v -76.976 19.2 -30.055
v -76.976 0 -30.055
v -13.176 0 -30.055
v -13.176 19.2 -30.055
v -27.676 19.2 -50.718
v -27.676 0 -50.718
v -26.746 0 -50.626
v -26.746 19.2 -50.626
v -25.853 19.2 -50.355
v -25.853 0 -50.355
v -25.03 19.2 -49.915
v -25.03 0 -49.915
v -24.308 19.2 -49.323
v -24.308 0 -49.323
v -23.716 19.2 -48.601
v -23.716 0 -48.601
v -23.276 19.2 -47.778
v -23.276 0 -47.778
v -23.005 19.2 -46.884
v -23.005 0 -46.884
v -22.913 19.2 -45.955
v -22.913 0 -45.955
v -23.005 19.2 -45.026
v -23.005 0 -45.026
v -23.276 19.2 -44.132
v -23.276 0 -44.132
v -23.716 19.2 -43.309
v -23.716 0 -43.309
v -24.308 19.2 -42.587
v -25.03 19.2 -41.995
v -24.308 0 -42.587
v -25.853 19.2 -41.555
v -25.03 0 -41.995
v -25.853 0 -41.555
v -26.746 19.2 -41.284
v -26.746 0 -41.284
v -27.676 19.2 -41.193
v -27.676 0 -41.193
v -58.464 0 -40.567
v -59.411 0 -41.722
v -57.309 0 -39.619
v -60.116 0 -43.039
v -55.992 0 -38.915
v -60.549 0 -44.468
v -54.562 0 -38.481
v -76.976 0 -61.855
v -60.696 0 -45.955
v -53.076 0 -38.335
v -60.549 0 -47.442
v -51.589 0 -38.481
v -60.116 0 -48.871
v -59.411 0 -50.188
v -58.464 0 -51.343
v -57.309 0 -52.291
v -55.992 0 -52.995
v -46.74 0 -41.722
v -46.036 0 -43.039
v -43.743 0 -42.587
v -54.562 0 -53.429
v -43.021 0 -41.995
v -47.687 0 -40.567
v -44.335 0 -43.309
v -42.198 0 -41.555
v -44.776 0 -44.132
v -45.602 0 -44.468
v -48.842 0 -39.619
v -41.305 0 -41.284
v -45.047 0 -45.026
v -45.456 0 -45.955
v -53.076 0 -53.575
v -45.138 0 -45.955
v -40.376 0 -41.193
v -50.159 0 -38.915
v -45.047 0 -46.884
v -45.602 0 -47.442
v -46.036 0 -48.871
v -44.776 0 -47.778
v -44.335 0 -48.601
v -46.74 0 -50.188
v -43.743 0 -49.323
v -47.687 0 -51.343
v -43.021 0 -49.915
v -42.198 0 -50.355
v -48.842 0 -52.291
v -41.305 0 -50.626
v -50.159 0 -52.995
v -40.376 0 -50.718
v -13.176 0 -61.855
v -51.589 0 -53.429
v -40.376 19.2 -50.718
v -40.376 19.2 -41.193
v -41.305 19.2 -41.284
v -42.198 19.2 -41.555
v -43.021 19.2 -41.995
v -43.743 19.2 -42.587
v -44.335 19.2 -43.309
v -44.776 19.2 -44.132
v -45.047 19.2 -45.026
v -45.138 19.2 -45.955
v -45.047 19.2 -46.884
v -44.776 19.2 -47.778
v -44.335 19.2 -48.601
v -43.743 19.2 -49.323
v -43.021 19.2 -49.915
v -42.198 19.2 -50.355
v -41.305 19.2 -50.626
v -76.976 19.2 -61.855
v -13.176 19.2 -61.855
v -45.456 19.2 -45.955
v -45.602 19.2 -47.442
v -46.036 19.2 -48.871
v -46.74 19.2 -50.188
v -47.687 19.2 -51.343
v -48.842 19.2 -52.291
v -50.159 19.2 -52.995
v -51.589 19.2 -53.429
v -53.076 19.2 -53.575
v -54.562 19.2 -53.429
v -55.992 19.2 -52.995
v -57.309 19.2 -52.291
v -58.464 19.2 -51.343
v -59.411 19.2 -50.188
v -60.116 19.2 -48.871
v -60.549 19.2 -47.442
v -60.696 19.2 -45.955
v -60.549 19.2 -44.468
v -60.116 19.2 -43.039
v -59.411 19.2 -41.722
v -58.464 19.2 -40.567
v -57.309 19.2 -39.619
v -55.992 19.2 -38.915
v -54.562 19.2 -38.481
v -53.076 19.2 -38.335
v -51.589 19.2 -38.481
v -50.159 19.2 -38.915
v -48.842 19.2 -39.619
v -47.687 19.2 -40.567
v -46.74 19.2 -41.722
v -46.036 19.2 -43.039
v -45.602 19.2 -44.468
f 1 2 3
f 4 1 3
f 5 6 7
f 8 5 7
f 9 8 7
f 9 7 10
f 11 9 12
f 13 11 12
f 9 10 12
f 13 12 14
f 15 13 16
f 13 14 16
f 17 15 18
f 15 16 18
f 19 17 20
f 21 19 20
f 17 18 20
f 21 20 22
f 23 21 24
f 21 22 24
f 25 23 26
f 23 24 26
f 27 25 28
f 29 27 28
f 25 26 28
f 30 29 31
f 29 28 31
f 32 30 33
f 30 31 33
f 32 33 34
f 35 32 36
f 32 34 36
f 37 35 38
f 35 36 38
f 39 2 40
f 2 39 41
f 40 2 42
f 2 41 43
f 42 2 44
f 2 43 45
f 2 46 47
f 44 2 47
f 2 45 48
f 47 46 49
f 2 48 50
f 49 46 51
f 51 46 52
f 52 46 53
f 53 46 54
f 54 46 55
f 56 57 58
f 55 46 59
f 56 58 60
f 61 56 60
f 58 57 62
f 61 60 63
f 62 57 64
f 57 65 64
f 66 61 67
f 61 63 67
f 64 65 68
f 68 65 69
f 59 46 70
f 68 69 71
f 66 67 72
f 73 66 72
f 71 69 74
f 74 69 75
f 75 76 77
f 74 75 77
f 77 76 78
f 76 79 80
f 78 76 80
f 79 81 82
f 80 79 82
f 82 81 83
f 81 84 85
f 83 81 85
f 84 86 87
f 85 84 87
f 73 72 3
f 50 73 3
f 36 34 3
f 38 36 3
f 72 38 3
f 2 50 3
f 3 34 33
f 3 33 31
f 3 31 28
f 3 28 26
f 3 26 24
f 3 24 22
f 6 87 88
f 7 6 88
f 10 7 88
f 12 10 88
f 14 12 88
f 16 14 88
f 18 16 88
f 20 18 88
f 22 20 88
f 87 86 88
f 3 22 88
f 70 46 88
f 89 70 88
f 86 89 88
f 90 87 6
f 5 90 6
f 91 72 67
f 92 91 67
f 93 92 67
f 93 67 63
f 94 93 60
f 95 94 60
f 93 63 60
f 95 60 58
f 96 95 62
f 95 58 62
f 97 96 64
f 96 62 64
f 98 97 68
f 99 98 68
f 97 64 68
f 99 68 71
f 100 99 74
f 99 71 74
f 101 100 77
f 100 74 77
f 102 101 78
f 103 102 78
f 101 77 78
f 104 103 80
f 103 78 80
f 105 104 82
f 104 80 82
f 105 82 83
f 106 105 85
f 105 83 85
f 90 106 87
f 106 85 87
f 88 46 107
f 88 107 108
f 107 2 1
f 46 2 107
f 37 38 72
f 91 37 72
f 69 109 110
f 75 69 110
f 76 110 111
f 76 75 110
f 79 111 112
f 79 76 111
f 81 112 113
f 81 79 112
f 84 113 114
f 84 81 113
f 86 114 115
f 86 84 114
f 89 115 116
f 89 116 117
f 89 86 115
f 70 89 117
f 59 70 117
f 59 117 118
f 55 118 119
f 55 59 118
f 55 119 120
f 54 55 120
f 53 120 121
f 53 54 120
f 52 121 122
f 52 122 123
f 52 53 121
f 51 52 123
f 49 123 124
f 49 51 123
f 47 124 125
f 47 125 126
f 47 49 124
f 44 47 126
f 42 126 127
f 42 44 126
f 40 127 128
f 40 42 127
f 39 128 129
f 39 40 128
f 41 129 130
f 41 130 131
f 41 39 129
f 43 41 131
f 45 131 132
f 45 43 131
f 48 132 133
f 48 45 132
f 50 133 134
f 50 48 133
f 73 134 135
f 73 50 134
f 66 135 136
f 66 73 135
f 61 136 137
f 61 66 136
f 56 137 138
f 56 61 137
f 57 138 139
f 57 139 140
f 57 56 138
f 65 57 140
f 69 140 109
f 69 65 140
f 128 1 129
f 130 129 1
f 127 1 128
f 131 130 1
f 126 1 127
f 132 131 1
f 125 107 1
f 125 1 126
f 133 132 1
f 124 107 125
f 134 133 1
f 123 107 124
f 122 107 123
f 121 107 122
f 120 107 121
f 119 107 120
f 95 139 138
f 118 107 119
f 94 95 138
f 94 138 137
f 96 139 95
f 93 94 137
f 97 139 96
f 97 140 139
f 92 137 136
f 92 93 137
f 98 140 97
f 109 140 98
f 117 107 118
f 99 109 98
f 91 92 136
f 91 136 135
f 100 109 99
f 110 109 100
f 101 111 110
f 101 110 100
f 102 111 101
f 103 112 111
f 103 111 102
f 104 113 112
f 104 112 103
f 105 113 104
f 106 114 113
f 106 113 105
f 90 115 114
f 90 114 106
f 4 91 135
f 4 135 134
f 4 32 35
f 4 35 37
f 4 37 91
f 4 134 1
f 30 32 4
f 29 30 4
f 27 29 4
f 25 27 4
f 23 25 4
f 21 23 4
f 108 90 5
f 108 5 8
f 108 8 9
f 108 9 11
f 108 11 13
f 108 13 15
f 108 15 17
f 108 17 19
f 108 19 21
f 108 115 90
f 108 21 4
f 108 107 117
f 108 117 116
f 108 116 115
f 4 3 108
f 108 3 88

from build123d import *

# Parameters (mm, degrees)
SKETCH1_W           = 63.8
SKETCH1_H           = 31.8
SKETCH1_R           = 7.62
BOSS_EXTRUDE1_DEPTH = 19.2


with BuildPart() as part:
    # Sketch1 → Boss-Extrude1 (new body)
    with BuildSketch(Plane(origin=(0, 0, 0), x_dir=(1, 0, 0), z_dir=(0, 1, 0))):
        with Locations((-45.075543036, 45.955000213)):
            Rectangle(SKETCH1_W, SKETCH1_H)
        with Locations((-53.075543036, 45.955000213)):
            Circle(SKETCH1_R, mode=Mode.SUBTRACT)
        with BuildLine():
            Line((-40.375543036, 50.717500213), (-27.675543036, 50.717500213))
            ThreePointArc((-27.675543036, 50.717500213), (-22.913043036, 45.955000213), (-27.675543036, 41.192500213))
            Line((-27.675543036, 41.192500213), (-40.375543036, 41.192500213))
            ThreePointArc((-40.375543036, 41.192500213), (-45.138043036, 45.955000213), (-40.375543036, 50.717500213))
        make_face(mode=Mode.SUBTRACT)
    extrude(amount=BOSS_EXTRUDE1_DEPTH)


solid = part.part
